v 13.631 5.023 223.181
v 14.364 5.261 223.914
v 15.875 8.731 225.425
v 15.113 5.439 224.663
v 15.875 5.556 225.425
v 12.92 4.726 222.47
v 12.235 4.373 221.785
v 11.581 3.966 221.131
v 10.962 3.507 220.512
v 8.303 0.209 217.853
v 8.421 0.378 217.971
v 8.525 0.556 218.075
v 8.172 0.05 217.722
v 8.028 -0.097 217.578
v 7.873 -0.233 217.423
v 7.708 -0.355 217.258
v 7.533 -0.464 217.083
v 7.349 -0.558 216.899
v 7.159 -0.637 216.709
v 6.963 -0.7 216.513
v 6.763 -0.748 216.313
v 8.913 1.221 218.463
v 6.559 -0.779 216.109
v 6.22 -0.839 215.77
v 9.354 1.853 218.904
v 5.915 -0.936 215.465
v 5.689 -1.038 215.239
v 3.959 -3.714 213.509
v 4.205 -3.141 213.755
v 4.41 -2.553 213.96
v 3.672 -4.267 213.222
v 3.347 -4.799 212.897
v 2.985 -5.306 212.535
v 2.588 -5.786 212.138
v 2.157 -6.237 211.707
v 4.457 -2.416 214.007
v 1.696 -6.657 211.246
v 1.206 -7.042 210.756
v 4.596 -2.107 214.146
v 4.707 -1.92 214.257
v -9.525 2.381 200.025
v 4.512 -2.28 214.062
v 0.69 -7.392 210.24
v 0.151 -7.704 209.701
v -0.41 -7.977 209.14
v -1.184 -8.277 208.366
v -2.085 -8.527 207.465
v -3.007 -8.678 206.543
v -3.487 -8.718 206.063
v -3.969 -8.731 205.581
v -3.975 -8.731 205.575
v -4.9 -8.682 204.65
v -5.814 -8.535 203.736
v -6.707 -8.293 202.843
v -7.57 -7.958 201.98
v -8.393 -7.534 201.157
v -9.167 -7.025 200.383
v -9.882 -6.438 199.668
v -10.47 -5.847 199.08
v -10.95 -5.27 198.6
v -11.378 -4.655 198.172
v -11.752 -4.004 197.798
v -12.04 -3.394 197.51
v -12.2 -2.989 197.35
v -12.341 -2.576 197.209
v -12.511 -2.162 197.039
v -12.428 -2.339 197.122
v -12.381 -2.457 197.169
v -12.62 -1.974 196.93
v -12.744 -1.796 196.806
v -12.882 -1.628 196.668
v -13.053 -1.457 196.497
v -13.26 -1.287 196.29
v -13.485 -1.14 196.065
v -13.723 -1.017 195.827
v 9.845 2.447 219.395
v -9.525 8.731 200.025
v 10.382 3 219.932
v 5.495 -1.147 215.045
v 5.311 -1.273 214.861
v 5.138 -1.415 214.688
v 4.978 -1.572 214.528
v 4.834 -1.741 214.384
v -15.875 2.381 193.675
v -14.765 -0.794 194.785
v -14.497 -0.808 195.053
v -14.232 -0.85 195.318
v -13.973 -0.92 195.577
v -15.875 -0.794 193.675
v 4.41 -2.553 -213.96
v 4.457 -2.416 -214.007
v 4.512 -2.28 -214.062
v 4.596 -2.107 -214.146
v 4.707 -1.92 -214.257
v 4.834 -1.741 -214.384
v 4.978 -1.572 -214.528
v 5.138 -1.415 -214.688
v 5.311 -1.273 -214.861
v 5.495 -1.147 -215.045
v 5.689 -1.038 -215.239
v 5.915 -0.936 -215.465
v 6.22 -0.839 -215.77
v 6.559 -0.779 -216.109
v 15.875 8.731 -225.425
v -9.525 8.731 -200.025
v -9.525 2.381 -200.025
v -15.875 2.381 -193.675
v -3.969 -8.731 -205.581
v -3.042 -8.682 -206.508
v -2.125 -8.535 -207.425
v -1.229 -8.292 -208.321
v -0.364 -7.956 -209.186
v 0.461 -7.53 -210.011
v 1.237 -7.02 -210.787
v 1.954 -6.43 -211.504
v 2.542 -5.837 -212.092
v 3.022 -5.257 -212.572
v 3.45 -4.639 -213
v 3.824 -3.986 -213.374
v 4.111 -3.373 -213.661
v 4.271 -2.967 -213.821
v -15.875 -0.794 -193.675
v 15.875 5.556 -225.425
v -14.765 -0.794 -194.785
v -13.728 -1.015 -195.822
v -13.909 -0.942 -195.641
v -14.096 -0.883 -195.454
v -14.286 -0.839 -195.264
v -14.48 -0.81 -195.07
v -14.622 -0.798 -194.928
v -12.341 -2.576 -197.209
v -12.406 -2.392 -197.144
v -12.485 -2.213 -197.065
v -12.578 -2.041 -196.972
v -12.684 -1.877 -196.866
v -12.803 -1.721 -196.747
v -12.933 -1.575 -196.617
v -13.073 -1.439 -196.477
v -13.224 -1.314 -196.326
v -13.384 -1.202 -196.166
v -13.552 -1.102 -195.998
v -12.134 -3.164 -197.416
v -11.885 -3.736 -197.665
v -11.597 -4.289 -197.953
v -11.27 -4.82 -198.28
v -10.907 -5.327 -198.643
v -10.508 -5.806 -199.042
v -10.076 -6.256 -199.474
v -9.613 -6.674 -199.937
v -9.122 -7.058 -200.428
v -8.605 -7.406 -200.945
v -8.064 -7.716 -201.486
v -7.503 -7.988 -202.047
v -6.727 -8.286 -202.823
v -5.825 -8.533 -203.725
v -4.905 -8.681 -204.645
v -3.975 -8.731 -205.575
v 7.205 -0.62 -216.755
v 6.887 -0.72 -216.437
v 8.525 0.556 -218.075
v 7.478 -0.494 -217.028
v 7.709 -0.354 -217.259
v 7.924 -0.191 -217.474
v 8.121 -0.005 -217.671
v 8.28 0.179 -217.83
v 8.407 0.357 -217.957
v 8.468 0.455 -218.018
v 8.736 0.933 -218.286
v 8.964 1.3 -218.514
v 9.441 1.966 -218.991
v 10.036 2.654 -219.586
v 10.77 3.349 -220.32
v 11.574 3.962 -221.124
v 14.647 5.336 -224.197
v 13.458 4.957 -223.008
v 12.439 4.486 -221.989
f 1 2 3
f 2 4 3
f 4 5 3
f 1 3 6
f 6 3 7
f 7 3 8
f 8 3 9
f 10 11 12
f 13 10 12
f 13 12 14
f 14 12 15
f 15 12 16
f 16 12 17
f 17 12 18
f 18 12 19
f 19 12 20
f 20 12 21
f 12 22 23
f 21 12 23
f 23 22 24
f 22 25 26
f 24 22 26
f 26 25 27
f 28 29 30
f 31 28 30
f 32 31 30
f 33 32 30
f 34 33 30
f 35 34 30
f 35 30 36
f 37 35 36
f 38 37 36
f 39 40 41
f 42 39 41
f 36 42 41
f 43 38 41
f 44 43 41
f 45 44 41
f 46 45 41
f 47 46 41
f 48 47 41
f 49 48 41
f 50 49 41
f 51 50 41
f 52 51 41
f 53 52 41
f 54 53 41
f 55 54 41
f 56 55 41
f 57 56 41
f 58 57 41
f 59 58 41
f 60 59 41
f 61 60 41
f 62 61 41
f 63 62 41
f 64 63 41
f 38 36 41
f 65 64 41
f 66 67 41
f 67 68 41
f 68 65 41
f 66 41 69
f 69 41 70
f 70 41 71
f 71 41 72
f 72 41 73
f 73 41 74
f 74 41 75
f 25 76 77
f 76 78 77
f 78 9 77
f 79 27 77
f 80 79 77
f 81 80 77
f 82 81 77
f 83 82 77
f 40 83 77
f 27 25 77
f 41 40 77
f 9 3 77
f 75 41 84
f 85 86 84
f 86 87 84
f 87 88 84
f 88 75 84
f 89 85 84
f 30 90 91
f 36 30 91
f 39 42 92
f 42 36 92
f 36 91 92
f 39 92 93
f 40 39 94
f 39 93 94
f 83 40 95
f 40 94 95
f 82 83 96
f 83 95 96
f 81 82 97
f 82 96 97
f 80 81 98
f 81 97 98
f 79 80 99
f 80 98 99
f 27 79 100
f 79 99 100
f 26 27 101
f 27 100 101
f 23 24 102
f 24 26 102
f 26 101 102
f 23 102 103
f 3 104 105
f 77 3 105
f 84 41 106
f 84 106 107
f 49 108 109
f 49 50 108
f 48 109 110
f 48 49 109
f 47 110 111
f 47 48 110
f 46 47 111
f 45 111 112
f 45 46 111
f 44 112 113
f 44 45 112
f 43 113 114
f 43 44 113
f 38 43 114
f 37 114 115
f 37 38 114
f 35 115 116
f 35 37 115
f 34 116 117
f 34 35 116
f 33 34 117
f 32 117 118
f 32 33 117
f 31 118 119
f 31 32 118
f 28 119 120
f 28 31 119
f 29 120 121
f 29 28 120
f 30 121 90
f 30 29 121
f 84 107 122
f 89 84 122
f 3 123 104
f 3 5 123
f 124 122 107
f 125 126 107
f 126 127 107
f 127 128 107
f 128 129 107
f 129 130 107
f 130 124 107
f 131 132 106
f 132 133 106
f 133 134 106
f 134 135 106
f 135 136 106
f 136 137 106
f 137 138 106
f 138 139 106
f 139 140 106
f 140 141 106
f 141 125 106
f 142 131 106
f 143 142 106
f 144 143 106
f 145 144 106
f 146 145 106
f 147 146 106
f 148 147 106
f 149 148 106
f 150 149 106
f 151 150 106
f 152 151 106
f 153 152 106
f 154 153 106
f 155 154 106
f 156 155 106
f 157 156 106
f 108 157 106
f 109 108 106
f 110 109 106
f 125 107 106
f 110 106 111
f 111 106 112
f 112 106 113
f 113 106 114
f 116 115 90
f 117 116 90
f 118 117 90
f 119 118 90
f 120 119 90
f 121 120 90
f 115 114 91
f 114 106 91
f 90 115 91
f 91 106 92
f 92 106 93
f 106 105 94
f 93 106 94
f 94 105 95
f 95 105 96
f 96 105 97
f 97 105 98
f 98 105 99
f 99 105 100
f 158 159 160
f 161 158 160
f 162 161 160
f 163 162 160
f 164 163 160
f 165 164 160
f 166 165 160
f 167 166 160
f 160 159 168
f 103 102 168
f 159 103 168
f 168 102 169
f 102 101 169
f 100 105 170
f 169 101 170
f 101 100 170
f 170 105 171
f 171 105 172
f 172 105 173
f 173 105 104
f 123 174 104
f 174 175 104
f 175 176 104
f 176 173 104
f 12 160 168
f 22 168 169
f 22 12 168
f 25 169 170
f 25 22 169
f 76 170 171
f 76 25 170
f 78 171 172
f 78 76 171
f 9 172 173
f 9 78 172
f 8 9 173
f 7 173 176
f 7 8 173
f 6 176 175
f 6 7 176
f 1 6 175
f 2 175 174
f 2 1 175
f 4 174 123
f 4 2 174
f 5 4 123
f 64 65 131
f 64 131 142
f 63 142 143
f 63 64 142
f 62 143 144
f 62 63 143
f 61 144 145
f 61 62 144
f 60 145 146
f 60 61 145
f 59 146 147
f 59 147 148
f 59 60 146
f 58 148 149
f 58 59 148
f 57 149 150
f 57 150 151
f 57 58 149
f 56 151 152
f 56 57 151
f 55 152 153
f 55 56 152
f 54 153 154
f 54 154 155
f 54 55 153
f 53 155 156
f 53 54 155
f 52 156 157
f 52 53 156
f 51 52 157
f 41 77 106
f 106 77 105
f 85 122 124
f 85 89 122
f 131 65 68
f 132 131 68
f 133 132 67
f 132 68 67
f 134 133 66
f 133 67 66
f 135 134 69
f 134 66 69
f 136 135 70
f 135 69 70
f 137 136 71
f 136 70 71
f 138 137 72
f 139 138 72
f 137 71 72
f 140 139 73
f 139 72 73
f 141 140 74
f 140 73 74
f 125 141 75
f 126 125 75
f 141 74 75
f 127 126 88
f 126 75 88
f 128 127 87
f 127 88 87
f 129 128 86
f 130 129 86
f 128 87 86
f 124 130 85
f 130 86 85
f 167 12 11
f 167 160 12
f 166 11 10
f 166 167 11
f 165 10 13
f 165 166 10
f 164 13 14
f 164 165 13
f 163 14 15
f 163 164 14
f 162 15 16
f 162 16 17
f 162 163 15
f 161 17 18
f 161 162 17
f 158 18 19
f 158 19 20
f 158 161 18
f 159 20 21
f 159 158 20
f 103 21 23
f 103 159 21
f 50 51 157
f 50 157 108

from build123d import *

# Parameters (mm, degrees)
F1_DEPTH = 225.425
F2_R     = 2.54
F3_R     = 2.54
F4_R     = 2.54
F6_DEPTH = 17.4635001
F8_DEPTH = 6.35


# Not quite as in the source:
# - ends of sketch curves that miss each other by under 0.0002 mm in the source are joined


with BuildPart() as f1:
    # F0 (on Top) → F1 (new body, symmetric)
    with BuildSketch(Plane.XY):
        with BuildLine():
            Line((15.875, 5.55625), (15.875, 8.73125))
            Line((15.875, 8.73125), (-15.875, 8.73125))
            Line((-15.875, 8.73125), (-15.875, -0.79375))
            Line((-15.875, -0.79375), (-12.7, -0.79375))
            ThreePointArc((-12.7, -0.79375), (-9.8710707302, -6.4481459867), (-3.9751, -8.73125))
            Line((-3.9751, -8.73125), (-3.96875, -8.73125))
            ThreePointArc((-3.96875, -8.73125), (1.9312218072, -6.4502821485), (4.7625, -0.79375))
            Line((4.7625, -0.79375), (7.9375, -0.79375))
            ThreePointArc((7.9375, -0.79375), (10.9883747468, 3.5285940665), (15.875, 5.55625))
        make_face()
    extrude(amount=F1_DEPTH, both=True)

    # F2
    f2_edges = [f1.edges().sort_by_distance(p)[0] for p in [
        (7.9375, -0.79375, 0),
    ]]
    fillet(f2_edges, radius=F2_R)

    # F3
    f3_edges = [f1.edges().sort_by_distance(p)[0] for p in [
        (-12.7, -0.79375, 0),
    ]]
    fillet(f3_edges, radius=F3_R)

    # F4
    f4_edges = [f1.edges().sort_by_distance(p)[0] for p in [
        (4.7625, -0.79375, 0),
    ]]
    fillet(f4_edges, radius=F4_R)

    # F5 (on face) → F6 (cut, through all)
    with BuildSketch(Plane(origin=(0, 8.73125, 0), x_dir=(-1, 0, 0), z_dir=(0, 1, 0))):
        Polygon((15.875, 225.425), (-15.875, 225.425), (15.875, 193.675), align=None)
        Polygon((15.875, -193.675), (-15.875, -225.425), (15.875, -225.425), align=None)
    extrude(amount=-F6_DEPTH, mode=Mode.SUBTRACT)

    # F7 (on face) → F8 (cut)
    with BuildSketch(Plane(origin=(0, 8.73125, 0), x_dir=(-1, 0, 0), z_dir=(0, 1, 0))):
        Polygon((15.875, 193.675), (9.525, 200.025), (9.525, -200.025), (15.875, -193.675), align=None)
    extrude(amount=-F8_DEPTH, mode=Mode.SUBTRACT)


solid = f1.part
